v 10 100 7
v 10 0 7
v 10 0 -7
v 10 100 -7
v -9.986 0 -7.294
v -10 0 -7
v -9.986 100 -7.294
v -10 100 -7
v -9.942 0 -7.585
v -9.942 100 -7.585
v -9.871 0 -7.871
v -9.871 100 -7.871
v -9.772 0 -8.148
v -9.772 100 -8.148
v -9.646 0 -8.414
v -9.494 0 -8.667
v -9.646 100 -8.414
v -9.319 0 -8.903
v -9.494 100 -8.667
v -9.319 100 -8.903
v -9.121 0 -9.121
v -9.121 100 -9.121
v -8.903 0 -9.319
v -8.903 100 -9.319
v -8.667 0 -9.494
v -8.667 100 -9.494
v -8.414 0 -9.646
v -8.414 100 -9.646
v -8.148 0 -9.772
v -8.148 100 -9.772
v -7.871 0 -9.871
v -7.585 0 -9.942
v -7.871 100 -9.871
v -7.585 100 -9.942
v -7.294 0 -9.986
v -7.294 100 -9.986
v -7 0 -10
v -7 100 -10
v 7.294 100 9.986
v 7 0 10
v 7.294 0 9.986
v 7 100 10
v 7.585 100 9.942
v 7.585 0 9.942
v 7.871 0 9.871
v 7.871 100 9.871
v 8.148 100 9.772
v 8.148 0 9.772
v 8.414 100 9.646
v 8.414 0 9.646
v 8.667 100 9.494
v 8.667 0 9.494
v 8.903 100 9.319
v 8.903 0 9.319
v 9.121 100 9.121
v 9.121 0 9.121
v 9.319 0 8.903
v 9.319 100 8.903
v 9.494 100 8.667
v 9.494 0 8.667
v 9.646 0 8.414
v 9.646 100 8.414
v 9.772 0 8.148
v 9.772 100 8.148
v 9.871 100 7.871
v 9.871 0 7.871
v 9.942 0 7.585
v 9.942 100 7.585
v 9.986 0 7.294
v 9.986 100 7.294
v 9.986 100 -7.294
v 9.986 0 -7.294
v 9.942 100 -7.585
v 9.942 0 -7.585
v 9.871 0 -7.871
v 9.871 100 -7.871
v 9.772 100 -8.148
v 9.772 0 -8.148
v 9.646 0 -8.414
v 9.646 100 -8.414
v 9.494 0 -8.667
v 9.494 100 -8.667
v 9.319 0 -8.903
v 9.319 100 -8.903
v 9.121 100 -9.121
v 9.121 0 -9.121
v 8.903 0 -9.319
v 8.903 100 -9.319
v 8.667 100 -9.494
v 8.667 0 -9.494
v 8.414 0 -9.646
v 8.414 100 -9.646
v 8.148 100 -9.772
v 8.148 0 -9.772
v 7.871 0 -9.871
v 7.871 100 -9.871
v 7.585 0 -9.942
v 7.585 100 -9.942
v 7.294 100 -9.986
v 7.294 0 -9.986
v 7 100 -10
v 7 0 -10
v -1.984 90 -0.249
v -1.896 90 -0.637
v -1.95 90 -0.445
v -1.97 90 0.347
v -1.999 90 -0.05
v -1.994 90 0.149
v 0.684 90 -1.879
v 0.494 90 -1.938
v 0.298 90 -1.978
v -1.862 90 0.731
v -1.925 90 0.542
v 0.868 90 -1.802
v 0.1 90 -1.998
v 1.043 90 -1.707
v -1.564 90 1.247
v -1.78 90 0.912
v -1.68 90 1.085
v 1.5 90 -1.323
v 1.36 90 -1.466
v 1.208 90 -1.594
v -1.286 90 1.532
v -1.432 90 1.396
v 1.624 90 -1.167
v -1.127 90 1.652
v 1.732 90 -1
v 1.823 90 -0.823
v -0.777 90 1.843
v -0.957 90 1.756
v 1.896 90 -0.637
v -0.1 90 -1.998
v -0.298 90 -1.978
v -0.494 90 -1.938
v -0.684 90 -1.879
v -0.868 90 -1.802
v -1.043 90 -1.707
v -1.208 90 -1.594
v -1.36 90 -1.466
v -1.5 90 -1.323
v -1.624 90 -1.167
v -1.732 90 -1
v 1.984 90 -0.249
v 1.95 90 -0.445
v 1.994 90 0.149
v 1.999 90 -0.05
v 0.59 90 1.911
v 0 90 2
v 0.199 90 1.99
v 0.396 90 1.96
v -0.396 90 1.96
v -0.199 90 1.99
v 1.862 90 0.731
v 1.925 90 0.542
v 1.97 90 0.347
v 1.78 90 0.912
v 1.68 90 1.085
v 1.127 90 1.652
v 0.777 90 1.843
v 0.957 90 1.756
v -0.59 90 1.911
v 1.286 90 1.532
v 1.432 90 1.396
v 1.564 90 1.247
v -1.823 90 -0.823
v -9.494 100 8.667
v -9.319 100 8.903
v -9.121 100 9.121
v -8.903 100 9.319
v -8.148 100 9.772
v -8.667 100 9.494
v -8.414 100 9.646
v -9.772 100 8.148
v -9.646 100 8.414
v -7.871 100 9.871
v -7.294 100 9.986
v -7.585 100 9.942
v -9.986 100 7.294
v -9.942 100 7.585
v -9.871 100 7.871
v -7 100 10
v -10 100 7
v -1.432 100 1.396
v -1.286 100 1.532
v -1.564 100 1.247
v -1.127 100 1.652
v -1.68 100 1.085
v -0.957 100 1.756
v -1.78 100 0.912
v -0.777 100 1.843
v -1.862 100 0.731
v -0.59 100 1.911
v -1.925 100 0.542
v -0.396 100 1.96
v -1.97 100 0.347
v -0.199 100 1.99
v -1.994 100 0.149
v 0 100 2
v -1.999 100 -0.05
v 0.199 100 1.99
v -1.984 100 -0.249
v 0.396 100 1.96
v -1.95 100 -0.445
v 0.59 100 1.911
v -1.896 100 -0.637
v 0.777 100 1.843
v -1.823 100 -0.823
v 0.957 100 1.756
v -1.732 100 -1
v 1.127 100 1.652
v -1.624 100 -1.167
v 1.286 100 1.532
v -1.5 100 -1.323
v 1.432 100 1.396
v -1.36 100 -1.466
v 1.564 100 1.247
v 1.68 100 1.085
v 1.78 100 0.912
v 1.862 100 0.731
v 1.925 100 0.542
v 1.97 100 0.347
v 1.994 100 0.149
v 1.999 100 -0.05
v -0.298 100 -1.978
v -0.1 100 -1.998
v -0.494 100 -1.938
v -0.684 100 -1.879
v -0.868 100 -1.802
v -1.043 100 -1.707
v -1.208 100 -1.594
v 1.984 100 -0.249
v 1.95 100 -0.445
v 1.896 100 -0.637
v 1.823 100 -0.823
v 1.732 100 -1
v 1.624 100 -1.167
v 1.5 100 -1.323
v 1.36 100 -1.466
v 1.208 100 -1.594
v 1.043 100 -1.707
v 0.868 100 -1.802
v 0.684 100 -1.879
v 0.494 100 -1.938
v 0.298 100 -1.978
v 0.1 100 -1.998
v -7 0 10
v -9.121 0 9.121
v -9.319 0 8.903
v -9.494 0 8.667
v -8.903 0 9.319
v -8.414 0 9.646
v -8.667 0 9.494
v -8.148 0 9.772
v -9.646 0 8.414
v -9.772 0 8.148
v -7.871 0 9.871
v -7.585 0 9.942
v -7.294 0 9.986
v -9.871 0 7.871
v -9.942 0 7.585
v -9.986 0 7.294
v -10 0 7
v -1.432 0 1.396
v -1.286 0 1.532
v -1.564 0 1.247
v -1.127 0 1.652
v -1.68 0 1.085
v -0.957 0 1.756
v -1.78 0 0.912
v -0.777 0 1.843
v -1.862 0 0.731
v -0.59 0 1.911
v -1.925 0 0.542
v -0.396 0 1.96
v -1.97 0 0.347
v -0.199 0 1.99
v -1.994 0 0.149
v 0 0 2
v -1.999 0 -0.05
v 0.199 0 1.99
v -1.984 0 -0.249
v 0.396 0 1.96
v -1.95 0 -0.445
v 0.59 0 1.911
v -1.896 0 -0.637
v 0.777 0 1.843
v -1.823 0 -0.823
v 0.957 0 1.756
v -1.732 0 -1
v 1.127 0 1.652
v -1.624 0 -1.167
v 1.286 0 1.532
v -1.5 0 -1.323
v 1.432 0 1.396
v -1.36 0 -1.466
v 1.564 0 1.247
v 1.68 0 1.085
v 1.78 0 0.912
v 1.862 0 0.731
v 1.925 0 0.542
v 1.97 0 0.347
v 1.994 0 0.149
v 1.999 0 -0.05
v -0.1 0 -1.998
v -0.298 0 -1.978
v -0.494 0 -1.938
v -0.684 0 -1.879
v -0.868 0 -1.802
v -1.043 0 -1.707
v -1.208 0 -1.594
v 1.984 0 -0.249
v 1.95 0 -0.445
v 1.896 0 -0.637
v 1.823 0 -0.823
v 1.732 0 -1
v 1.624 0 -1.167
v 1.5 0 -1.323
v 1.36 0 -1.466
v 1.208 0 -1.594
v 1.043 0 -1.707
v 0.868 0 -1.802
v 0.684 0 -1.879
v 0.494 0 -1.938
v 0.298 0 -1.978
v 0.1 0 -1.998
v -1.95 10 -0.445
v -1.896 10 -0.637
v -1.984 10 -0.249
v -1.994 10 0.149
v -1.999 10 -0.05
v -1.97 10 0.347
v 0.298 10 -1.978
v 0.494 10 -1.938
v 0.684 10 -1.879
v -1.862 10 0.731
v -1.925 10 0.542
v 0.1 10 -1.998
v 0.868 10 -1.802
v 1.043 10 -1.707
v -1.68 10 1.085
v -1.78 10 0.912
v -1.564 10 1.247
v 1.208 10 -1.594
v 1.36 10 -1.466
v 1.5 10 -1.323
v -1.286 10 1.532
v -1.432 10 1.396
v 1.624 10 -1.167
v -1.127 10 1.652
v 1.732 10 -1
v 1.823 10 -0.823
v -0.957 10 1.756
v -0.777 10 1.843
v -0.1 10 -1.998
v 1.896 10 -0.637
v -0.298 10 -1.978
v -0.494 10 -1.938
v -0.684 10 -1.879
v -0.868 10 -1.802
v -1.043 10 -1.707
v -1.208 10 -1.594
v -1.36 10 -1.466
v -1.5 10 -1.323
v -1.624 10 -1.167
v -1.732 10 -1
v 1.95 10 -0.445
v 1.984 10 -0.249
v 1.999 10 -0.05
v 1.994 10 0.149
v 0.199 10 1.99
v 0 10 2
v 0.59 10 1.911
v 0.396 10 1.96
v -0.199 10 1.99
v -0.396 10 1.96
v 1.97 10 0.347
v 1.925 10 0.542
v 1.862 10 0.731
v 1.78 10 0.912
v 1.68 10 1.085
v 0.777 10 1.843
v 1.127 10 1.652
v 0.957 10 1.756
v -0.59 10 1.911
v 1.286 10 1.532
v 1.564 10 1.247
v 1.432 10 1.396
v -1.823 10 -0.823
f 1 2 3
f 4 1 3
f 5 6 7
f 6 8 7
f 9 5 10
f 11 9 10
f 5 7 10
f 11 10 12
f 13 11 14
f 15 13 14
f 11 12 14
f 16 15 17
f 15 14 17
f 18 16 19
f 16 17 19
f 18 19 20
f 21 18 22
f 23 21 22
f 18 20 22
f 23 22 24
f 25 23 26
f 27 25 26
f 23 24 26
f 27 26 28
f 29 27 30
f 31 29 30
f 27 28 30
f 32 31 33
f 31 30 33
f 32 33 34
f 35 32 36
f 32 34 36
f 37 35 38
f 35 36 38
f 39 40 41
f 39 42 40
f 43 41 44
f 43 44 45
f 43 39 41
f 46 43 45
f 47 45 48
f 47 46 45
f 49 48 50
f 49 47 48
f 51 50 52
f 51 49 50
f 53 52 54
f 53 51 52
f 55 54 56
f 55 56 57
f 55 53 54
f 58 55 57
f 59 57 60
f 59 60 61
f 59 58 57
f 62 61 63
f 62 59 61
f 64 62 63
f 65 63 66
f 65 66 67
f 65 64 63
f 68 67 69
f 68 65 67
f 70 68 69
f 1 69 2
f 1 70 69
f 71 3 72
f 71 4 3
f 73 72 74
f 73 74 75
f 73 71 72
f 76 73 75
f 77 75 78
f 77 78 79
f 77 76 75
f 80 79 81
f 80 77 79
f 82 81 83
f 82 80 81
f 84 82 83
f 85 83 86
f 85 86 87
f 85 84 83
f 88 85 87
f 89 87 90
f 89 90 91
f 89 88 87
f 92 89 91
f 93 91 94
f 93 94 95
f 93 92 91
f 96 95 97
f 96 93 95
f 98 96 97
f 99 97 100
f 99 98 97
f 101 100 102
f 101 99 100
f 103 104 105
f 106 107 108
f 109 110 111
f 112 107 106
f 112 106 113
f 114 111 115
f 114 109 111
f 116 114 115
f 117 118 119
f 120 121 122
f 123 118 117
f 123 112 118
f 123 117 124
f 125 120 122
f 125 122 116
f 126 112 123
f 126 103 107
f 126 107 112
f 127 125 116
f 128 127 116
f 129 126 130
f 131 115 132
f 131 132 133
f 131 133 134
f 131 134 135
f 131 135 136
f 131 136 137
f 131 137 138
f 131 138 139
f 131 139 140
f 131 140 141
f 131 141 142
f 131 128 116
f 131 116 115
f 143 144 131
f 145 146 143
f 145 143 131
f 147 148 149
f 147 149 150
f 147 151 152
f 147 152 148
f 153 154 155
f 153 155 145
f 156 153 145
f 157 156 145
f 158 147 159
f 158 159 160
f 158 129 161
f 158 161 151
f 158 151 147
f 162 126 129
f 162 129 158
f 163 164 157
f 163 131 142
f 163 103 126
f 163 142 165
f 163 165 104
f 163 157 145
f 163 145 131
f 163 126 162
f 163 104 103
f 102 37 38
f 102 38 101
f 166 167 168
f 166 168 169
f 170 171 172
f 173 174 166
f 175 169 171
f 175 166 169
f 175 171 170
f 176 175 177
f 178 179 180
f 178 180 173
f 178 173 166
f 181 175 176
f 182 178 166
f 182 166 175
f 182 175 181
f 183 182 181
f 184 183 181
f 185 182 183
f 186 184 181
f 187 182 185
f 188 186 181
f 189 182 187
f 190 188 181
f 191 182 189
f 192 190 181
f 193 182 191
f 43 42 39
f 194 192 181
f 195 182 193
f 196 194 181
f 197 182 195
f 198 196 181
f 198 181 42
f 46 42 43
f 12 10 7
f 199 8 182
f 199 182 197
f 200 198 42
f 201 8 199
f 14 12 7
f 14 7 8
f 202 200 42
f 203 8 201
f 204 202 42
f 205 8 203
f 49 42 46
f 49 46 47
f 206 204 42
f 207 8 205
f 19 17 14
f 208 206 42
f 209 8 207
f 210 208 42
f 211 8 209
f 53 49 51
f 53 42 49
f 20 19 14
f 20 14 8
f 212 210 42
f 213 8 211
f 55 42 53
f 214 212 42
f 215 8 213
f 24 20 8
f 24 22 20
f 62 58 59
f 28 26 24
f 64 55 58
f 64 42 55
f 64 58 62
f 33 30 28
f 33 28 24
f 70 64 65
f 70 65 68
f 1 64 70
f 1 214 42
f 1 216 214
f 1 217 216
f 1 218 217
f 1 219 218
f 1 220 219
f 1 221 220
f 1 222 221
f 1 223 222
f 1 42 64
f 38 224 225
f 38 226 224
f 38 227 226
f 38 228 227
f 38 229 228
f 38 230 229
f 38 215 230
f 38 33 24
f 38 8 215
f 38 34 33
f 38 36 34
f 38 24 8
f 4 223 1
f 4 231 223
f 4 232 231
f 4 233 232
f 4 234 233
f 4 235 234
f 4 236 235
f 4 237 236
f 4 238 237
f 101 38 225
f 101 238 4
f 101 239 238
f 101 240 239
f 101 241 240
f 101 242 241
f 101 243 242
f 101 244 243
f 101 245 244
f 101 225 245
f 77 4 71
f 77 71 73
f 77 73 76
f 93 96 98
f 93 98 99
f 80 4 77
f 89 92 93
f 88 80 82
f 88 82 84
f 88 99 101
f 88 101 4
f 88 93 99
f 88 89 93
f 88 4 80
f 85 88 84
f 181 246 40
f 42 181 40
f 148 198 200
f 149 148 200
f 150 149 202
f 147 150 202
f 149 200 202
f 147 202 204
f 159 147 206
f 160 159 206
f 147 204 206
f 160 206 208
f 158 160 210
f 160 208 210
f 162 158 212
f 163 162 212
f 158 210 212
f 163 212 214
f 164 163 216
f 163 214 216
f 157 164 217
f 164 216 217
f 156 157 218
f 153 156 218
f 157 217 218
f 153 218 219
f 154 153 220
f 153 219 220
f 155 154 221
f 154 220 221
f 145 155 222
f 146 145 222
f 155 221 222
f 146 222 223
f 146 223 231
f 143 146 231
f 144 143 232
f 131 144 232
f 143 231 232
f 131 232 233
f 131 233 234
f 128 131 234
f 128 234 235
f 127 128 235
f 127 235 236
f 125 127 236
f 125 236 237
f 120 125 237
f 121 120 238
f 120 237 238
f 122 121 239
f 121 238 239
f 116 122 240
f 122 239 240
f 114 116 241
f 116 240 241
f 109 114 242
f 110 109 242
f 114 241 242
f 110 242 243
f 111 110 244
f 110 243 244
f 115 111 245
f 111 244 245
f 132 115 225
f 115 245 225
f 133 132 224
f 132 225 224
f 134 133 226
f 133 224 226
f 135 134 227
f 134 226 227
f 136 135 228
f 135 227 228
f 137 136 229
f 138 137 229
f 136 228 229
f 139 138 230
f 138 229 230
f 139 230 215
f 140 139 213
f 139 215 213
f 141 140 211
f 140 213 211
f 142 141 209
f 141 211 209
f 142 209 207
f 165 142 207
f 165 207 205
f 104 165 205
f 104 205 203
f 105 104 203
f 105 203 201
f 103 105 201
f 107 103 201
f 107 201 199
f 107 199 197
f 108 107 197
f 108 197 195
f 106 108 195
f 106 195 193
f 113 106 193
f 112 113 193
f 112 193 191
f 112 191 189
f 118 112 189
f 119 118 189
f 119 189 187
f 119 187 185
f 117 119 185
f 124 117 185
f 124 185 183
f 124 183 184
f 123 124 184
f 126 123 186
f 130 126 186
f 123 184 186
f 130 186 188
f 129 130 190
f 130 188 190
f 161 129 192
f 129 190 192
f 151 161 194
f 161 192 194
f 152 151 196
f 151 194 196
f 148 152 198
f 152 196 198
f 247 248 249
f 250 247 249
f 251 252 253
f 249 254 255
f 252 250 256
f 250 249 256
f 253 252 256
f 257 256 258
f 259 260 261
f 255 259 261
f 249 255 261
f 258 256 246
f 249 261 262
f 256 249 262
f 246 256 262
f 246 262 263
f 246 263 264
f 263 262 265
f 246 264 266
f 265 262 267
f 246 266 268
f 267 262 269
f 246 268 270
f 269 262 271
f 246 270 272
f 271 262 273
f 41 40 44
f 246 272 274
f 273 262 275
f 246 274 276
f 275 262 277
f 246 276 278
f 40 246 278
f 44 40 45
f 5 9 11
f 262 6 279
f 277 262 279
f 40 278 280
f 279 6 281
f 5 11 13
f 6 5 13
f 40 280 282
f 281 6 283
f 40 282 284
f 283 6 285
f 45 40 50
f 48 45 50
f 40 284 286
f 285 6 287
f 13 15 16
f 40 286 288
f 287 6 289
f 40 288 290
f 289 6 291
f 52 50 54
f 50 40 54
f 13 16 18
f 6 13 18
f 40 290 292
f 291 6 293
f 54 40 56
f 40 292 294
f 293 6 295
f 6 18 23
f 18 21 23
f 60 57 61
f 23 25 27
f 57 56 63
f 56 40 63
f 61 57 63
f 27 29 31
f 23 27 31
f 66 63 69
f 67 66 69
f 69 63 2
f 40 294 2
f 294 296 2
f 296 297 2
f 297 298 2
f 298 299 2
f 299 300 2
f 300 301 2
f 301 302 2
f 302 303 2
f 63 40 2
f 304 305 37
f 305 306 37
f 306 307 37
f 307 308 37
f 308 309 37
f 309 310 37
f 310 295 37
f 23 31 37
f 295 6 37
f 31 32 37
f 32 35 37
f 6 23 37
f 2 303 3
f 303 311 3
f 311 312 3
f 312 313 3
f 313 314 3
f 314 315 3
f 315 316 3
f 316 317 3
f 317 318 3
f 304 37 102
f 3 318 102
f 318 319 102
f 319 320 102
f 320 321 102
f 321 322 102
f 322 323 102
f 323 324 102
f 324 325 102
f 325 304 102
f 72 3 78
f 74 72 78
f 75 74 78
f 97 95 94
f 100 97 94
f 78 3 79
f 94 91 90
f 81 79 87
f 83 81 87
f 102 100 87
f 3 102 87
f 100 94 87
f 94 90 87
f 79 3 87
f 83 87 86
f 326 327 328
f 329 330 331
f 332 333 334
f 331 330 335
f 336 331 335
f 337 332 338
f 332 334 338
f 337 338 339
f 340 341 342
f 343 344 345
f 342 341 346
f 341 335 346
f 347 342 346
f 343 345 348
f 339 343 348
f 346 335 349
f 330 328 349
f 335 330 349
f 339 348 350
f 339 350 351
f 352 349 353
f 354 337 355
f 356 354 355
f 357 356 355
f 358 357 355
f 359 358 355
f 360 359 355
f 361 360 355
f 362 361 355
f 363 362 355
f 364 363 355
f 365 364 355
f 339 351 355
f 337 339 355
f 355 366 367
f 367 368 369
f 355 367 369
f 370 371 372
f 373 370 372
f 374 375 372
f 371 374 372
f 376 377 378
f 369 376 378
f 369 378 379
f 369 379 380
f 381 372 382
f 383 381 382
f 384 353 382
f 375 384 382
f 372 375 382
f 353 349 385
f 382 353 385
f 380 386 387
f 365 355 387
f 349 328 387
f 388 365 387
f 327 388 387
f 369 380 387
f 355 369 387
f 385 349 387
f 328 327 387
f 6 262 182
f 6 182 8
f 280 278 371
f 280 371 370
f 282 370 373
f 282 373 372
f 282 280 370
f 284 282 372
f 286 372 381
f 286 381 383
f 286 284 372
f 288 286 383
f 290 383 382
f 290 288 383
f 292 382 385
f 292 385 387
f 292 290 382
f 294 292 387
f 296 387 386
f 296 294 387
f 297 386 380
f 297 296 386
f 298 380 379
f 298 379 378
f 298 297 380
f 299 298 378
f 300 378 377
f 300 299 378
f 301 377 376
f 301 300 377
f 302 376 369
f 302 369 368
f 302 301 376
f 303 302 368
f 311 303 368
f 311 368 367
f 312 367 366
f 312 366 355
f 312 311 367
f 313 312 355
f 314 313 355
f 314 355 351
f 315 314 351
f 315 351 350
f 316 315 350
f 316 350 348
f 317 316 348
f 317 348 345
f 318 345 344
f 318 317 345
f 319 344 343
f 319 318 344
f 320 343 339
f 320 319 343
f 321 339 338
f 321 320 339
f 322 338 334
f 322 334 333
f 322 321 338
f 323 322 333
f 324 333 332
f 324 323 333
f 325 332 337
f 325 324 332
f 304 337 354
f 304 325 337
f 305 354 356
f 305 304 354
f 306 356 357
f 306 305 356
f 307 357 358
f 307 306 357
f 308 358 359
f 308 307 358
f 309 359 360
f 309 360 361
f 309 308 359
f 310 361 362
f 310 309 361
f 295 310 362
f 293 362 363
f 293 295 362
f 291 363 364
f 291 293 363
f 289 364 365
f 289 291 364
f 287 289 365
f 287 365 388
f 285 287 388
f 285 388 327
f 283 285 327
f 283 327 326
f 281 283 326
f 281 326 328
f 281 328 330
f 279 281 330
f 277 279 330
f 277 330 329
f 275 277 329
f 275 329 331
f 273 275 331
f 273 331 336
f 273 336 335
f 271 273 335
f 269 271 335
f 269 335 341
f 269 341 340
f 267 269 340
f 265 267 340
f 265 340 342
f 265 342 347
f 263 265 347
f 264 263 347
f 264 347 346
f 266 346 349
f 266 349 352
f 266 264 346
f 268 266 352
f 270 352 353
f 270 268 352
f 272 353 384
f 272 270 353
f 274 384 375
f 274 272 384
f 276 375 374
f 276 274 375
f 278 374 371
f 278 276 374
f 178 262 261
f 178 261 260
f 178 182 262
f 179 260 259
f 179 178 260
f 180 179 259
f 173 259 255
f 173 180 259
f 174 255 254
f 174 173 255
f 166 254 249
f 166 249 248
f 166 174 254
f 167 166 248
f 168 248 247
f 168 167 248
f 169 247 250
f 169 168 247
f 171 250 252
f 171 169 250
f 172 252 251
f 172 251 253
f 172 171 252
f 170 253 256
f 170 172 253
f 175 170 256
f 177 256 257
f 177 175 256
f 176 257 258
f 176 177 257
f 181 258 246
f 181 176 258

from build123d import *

# Parameters (mm, degrees)
SKETCH1_W           = 20
SKETCH1_H           = 20
BOSS_EXTRUDE1_DEPTH = 100
FILLET1_R           = 3
SKETCH4_R           = 2
CUT_EXTRUDE1_DEPTH  = 10


with BuildPart() as part:
    # Sketch1 → Boss-Extrude1 (new body)
    with BuildSketch(Plane(origin=(0, 0, 0), x_dir=(1, 0, 0), z_dir=(0, 1, 0))):
        Rectangle(SKETCH1_W, SKETCH1_H)
    extrude(amount=BOSS_EXTRUDE1_DEPTH)

    # Fillet1
    fillet1_edges = [part.edges().sort_by_distance(p)[0] for p in [
        (-10, 50, -10),
        (10, 50, -10),
        (10, 50, 10),
        (-10, 50, 10),
    ]]
    fillet(fillet1_edges, radius=FILLET1_R)

    # Sketch4 → Cut-Extrude1 (cut)
    with BuildSketch(Plane(origin=(0, 100, 0), x_dir=(1, 0, 0), z_dir=(0, 1, 0))):
        with Locations(Location((0, 0, 0), (0, 0, 270))):
            Circle(SKETCH4_R)
    cut_extrude1 = extrude(amount=-CUT_EXTRUDE1_DEPTH, mode=Mode.SUBTRACT)

    # Mirror1: Cut-Extrude1 across plane
    add(cut_extrude1.mirror(Plane.ZX.offset(50)), mode=Mode.SUBTRACT)


solid = part.part
